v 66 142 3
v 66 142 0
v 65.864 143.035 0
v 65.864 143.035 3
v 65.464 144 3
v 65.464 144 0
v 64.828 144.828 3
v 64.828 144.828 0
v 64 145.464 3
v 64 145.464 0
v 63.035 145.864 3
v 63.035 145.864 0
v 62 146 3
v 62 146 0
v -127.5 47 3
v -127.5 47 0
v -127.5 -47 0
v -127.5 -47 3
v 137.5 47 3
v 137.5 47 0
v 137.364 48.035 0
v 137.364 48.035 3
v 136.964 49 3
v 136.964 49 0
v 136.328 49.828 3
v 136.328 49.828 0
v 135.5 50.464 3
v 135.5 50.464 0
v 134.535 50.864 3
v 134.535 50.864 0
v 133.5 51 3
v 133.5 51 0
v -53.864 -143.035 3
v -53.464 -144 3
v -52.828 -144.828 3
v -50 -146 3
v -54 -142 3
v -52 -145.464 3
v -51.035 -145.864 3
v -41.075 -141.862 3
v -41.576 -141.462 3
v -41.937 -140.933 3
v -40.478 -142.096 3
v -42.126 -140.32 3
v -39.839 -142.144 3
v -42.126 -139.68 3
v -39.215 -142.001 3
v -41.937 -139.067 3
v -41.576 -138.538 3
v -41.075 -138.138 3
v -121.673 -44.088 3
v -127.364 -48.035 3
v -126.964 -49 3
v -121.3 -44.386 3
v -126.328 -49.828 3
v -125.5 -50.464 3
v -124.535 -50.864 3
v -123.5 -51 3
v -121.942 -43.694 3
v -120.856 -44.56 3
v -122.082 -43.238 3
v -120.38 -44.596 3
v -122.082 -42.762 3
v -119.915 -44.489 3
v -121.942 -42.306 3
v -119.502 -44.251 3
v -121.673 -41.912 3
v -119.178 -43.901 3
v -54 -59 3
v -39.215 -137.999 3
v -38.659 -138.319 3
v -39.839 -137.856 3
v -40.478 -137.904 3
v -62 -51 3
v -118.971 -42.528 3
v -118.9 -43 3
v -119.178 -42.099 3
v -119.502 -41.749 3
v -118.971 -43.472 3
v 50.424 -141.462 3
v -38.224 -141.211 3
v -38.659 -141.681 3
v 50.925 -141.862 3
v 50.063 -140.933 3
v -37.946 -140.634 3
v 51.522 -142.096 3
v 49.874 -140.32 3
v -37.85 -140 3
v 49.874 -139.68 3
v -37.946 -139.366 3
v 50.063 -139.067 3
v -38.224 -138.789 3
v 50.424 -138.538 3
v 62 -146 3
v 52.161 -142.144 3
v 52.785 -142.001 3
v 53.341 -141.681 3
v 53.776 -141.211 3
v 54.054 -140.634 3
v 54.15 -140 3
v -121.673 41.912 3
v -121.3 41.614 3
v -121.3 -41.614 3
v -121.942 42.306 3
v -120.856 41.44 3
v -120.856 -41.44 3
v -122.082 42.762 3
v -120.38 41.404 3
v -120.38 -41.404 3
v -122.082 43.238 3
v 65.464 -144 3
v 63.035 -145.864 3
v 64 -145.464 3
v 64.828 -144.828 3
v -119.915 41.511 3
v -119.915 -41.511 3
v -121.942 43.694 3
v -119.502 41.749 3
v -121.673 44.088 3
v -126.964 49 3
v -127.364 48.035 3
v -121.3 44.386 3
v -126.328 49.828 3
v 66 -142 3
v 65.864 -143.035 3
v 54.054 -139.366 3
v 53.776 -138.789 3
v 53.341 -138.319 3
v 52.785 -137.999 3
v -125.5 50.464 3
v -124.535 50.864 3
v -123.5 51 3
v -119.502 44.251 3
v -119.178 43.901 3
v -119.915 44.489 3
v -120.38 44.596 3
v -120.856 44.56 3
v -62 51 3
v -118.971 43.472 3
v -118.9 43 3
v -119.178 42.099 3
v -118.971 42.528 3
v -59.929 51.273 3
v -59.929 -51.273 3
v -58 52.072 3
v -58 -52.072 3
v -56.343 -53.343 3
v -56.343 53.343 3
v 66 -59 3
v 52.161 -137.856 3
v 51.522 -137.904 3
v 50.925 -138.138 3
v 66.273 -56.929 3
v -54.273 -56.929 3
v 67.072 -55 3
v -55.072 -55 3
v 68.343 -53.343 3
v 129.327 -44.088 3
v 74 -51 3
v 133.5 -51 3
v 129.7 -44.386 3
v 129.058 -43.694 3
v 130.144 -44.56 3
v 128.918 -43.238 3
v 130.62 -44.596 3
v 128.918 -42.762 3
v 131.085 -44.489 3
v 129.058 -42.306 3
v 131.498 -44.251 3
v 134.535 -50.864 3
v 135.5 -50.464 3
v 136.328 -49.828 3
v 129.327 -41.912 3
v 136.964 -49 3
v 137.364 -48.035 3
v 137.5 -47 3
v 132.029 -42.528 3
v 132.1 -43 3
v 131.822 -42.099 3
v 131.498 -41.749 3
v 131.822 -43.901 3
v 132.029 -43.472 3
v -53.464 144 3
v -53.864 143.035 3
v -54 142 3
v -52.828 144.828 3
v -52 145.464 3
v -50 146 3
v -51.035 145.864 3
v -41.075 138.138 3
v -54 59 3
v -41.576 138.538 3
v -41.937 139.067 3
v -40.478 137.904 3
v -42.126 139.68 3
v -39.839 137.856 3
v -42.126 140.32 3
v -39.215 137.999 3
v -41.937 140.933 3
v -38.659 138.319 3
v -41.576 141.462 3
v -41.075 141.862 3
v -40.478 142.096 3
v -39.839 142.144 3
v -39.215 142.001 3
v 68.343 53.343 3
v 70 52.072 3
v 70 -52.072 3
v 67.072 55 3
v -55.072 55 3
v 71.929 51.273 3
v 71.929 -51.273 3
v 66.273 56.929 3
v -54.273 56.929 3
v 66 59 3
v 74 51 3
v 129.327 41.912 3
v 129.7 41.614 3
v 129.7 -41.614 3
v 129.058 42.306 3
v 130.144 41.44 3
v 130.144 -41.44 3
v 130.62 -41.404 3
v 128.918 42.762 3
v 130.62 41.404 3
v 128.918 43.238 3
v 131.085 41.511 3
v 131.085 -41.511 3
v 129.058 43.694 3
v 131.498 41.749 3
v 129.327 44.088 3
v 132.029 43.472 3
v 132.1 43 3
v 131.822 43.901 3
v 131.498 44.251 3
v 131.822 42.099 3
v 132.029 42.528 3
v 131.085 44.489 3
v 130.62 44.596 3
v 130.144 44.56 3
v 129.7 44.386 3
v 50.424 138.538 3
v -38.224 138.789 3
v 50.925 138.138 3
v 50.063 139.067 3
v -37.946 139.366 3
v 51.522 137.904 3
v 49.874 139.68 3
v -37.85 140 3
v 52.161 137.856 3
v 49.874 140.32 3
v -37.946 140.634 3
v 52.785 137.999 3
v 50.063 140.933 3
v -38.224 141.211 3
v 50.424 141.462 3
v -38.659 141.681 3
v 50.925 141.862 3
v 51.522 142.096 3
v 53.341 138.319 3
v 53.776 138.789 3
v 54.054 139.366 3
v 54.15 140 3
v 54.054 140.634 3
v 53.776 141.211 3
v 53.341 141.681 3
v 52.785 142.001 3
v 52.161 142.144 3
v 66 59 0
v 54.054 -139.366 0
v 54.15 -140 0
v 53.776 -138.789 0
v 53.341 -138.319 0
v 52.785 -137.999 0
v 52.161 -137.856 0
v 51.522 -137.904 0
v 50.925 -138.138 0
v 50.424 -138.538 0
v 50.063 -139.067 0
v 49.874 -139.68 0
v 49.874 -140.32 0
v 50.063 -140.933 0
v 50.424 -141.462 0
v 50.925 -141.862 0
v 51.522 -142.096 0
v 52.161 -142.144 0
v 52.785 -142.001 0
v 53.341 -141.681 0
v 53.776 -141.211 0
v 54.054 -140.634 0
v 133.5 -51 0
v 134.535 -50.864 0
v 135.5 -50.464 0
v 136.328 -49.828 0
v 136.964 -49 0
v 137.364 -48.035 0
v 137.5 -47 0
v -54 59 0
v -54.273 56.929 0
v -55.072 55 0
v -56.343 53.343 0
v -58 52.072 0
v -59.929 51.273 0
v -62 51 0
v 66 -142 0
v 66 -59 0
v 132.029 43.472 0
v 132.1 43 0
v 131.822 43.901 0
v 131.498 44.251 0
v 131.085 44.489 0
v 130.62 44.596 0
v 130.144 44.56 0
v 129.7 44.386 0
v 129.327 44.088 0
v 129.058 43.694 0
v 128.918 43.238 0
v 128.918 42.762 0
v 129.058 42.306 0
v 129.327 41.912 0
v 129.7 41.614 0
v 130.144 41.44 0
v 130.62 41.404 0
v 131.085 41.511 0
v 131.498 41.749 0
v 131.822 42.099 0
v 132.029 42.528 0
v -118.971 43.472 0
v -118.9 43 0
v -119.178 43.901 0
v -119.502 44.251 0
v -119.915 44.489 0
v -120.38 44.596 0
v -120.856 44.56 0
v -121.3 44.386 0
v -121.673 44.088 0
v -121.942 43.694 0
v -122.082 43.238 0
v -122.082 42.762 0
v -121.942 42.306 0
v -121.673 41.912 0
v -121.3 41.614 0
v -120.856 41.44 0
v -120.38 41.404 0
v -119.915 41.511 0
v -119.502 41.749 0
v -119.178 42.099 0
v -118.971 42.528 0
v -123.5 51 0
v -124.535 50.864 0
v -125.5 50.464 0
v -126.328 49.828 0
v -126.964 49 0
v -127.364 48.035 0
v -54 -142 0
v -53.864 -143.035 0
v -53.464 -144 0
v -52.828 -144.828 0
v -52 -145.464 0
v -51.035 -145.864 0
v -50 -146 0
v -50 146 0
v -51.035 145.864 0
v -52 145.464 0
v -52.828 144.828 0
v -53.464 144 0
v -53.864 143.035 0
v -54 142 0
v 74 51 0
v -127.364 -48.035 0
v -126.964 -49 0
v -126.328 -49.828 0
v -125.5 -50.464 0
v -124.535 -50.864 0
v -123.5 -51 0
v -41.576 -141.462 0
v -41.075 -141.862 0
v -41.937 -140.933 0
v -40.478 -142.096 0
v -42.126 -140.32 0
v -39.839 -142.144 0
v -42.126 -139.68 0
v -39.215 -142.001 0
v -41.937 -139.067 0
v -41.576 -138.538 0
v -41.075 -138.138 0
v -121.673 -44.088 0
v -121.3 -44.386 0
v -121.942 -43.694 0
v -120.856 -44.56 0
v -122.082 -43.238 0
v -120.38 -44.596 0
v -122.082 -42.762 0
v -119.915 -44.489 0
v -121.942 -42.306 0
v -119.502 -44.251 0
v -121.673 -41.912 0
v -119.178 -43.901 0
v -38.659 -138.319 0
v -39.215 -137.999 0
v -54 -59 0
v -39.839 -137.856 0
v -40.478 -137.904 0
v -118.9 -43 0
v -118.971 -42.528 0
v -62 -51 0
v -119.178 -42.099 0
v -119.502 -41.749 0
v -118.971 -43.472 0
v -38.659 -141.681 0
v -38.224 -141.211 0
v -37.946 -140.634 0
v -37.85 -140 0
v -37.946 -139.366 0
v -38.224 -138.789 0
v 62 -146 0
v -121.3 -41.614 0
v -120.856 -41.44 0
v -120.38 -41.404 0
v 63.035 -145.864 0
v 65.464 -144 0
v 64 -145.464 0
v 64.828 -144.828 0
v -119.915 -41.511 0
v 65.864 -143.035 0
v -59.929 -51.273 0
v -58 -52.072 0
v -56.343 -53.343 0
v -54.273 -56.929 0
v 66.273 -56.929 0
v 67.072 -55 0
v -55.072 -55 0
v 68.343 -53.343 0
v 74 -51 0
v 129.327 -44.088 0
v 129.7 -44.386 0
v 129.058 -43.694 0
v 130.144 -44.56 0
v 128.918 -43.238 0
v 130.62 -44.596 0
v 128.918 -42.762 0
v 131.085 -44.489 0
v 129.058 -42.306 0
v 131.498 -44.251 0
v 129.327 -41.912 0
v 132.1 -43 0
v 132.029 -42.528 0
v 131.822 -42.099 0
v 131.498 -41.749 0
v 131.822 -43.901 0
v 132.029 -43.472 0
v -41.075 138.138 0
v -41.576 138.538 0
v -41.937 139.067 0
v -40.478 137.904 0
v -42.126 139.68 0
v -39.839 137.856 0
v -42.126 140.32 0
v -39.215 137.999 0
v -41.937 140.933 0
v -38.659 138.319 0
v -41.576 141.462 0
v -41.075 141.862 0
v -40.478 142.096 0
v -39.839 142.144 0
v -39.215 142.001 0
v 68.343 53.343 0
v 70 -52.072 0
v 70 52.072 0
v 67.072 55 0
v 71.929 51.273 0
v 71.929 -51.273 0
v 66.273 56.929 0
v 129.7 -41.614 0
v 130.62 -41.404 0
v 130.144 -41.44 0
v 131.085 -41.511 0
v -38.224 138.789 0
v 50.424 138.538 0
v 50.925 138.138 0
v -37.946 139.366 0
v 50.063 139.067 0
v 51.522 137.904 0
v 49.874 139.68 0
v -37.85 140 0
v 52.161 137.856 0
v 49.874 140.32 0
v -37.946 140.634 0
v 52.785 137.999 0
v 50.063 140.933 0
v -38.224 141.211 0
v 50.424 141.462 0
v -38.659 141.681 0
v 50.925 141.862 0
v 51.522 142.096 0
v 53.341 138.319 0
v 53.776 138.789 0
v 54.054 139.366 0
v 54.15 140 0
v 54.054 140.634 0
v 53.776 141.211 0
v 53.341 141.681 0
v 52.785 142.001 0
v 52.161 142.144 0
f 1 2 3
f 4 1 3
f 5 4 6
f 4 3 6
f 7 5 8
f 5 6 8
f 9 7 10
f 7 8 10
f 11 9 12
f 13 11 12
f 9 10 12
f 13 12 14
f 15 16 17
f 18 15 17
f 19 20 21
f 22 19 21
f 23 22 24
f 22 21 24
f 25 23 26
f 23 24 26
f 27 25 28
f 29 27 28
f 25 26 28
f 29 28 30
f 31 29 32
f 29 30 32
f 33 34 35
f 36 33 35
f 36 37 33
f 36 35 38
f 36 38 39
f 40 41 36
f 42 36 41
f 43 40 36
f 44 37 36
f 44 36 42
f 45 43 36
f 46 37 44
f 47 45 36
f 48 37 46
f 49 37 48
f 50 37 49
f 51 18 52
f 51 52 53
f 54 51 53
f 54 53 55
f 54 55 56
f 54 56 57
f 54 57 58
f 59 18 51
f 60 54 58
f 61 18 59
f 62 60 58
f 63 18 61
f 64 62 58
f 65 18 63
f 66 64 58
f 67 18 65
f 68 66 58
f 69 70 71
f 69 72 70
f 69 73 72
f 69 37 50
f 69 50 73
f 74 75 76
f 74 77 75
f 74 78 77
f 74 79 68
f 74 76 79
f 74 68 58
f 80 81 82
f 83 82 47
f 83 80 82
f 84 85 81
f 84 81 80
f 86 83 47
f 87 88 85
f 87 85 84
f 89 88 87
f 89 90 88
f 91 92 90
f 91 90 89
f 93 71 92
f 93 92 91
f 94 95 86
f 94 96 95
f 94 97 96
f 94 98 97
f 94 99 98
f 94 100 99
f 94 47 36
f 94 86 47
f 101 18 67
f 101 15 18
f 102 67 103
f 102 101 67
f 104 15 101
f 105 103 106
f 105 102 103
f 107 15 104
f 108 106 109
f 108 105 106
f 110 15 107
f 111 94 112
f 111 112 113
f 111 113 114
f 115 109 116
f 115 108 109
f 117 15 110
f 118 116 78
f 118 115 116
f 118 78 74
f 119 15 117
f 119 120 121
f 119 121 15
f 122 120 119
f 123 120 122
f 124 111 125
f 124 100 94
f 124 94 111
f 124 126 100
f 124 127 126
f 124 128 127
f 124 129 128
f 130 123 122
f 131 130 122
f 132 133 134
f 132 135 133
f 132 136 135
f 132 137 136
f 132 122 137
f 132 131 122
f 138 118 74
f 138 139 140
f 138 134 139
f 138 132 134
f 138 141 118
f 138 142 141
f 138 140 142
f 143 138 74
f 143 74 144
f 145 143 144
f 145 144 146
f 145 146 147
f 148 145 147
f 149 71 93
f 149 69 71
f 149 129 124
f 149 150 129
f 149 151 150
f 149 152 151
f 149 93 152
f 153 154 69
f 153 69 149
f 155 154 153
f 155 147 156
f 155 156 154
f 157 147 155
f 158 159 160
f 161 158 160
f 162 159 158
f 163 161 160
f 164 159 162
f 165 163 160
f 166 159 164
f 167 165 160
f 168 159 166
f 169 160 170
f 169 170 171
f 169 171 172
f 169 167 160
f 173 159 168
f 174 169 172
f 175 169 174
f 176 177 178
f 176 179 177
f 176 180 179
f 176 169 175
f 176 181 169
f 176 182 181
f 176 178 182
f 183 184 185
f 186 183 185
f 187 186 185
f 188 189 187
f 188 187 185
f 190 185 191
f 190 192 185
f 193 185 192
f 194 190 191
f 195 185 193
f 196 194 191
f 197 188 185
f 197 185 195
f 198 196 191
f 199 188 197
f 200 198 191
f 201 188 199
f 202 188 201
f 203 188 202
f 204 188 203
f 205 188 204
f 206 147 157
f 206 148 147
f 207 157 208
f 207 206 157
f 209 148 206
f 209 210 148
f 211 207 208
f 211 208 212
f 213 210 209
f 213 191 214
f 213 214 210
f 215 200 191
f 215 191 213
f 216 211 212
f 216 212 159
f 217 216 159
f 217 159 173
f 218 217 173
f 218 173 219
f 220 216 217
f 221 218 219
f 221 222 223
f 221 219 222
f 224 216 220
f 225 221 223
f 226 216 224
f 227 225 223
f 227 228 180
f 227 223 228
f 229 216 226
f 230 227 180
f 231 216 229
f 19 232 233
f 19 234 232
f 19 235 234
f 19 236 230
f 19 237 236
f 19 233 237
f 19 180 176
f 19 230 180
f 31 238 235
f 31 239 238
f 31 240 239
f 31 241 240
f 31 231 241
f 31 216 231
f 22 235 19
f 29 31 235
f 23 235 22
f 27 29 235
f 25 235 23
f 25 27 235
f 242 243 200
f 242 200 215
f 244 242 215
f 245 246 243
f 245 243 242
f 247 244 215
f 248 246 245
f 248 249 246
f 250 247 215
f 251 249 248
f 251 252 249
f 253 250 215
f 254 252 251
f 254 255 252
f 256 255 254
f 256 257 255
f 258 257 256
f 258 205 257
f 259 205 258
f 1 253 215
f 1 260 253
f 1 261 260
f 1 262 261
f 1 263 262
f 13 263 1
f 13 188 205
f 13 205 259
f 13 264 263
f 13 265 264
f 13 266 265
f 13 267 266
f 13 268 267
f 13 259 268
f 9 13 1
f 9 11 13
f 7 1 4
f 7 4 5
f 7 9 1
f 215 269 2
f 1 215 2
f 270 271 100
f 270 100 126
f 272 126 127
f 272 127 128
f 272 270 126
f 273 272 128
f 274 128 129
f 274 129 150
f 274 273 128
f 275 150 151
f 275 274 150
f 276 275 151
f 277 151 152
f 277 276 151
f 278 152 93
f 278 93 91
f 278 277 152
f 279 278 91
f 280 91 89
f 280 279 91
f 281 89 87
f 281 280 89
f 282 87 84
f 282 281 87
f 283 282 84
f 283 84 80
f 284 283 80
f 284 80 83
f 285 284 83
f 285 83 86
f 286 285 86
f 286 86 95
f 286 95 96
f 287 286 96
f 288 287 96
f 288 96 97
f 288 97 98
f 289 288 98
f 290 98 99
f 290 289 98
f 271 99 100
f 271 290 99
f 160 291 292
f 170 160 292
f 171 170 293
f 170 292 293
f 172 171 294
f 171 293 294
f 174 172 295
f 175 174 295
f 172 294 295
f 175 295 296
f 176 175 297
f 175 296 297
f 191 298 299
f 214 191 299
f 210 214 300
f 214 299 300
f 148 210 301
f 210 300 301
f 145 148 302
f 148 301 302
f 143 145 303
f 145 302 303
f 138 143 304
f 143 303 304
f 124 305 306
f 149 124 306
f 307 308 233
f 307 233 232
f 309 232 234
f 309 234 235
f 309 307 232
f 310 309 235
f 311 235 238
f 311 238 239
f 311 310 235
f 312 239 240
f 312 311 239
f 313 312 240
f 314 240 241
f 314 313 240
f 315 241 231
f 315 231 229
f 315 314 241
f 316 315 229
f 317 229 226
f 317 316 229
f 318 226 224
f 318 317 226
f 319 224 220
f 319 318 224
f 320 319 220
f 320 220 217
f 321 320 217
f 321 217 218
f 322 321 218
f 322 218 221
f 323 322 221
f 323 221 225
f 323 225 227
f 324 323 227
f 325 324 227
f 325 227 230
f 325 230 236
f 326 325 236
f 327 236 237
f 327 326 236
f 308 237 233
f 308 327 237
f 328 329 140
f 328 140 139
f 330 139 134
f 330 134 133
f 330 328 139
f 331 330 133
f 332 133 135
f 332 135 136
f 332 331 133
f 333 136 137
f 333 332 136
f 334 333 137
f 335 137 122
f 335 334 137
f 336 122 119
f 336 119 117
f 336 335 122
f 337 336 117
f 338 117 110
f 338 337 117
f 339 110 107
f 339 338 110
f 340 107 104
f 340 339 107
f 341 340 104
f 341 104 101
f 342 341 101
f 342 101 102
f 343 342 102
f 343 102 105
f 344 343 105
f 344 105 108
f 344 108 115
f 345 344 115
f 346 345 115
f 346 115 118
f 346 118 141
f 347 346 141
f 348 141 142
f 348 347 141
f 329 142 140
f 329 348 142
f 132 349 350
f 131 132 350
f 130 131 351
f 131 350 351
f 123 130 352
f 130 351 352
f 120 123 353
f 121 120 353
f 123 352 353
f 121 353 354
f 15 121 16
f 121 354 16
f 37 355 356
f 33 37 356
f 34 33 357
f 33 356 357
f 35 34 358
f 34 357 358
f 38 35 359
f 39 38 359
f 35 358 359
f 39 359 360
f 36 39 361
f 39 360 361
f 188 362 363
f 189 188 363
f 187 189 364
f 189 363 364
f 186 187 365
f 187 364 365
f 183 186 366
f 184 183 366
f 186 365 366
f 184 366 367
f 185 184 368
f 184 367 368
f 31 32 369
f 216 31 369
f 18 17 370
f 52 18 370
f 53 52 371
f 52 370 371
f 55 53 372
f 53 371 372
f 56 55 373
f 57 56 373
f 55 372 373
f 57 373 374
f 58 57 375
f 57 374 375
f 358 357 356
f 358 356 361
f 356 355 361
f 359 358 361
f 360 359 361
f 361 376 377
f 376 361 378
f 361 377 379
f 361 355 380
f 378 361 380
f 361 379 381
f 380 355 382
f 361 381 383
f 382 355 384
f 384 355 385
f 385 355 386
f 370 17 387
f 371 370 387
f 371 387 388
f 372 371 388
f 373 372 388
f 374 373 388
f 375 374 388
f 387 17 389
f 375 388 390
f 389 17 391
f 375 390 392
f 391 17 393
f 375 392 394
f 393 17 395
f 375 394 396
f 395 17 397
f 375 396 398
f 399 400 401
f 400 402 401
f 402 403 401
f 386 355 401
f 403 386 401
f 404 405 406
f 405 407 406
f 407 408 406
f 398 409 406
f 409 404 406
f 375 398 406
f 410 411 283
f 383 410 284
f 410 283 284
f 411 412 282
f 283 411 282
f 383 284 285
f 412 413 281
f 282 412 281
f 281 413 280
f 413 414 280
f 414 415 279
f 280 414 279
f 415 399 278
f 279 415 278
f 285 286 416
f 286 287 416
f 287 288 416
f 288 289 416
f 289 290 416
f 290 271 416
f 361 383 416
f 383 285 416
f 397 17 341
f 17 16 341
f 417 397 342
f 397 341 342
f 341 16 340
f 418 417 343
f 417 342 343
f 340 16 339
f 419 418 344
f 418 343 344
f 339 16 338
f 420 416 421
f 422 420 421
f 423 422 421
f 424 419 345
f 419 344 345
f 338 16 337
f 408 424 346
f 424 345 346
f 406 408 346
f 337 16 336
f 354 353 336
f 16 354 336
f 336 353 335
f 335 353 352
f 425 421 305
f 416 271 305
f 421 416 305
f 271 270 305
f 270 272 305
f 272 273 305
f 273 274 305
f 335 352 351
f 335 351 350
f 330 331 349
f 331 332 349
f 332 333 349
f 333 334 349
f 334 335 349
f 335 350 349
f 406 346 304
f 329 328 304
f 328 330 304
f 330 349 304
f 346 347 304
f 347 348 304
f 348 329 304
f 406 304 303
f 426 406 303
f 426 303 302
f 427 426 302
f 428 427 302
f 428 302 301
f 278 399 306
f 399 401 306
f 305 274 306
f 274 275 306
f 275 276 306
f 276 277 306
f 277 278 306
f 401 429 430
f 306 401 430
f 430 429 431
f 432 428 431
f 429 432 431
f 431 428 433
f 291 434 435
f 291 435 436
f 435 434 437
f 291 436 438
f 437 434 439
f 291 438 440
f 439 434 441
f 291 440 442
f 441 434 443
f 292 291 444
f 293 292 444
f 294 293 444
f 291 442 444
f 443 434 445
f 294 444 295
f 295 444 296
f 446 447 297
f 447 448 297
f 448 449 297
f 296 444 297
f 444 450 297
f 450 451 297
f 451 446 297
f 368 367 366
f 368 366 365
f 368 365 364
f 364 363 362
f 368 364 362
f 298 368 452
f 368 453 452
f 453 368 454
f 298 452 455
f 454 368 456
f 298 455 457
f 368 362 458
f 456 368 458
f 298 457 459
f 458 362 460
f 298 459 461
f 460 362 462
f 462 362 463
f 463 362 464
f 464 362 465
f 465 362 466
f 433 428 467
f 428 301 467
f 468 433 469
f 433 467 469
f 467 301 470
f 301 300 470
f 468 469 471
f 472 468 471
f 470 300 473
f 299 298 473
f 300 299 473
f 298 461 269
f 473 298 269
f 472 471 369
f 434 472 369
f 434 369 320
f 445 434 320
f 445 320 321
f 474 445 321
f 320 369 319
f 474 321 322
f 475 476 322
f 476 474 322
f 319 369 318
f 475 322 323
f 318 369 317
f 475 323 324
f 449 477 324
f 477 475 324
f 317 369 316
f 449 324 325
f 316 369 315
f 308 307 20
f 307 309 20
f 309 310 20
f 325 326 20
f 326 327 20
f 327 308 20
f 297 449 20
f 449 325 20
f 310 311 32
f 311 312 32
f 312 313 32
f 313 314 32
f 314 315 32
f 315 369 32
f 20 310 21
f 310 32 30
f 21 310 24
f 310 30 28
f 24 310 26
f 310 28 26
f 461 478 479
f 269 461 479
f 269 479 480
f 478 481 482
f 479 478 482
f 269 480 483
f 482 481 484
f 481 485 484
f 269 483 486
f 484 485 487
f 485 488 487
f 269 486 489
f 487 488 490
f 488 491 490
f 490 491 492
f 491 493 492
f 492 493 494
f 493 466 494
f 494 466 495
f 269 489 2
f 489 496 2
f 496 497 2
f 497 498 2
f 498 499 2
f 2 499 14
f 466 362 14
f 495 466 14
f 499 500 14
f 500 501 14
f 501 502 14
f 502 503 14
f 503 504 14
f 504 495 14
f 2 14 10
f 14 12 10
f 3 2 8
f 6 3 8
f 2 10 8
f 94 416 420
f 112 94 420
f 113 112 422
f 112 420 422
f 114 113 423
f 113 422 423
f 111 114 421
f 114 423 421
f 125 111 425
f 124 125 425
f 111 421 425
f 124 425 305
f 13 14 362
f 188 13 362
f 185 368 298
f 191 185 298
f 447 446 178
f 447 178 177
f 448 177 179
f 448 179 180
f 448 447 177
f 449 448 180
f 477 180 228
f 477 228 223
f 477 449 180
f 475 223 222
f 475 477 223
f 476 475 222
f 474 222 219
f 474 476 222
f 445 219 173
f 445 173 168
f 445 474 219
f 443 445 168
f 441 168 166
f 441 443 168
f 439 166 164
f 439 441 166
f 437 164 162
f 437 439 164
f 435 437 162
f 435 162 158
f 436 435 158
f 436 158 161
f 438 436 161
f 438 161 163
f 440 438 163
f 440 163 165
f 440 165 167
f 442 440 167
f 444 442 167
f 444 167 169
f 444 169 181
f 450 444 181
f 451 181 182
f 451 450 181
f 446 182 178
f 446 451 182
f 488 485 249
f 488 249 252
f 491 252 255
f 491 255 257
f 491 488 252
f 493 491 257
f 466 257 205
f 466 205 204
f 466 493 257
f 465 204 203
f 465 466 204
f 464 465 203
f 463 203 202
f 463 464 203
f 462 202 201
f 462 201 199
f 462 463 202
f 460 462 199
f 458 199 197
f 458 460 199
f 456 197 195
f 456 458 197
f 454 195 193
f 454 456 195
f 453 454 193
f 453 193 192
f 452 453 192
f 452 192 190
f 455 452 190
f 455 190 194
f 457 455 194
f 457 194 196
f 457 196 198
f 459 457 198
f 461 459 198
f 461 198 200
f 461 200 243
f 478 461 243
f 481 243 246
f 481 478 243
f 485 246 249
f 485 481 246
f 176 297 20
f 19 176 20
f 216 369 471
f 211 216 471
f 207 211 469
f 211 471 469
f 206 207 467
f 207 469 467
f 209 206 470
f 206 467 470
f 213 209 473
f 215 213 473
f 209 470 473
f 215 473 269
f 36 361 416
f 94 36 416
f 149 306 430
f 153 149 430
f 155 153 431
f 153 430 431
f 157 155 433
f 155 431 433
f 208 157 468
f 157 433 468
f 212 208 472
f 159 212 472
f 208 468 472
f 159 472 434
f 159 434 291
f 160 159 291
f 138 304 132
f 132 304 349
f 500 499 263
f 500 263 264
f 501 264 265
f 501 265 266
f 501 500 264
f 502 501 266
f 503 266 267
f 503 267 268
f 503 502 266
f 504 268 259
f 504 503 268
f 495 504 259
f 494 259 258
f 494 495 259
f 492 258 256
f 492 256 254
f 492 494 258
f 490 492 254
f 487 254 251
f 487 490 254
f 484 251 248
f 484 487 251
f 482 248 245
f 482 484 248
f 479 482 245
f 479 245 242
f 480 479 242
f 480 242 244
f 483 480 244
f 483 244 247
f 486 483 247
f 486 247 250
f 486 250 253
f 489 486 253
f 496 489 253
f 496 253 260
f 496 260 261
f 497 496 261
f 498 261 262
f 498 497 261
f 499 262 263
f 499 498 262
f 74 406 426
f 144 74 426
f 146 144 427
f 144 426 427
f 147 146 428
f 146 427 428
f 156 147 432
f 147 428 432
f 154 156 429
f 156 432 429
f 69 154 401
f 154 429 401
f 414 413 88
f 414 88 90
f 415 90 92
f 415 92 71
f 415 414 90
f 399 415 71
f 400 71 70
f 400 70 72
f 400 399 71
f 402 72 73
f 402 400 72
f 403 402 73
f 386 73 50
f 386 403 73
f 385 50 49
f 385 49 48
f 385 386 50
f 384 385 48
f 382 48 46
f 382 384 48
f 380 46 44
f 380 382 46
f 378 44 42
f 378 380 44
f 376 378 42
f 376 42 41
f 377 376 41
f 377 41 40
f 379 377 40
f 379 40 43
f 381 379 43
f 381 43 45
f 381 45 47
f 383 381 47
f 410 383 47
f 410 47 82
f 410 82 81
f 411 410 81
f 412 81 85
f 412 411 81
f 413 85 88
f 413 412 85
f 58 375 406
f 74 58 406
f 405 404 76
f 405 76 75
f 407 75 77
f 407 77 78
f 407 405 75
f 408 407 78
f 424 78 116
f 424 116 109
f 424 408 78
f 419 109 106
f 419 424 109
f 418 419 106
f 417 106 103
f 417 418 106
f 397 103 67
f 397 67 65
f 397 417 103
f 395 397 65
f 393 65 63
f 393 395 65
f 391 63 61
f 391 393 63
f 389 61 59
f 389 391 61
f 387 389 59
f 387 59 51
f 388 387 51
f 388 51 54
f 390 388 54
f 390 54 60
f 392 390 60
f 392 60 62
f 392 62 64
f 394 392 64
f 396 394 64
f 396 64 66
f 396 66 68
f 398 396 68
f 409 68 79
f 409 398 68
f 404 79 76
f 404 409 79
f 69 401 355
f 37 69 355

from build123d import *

# Parameters (mm, degrees)
SKETCH_183_R   = 2.15
SKETCH_183_R_2 = 1.6
F_3MM_DEPTH    = 3


with BuildPart() as part:
    # Sketch 183 → 二层板_拉伸3mm (new body)
    with BuildSketch(Plane.XY):
        with BuildLine():
            Line((-50, -146), (62, -146))
            ThreePointArc((62, -146), (64.828427125, -144.828427125), (66, -142))
            Line((66, -142), (66, -59))
            ThreePointArc((66, -59), (68.343145751, -53.343145751), (74, -51))
            Line((74, -51), (133.5, -51))
            ThreePointArc((133.5, -51), (136.328427125, -49.828427125), (137.5, -47))
            Line((137.5, -47), (137.5, 47))
            ThreePointArc((137.5, 47), (136.328427125, 49.828427125), (133.5, 51))
            Line((133.5, 51), (74, 51))
            ThreePointArc((74, 51), (68.343145751, 53.343145751), (66, 59))
            Line((66, 59), (66, 142))
            ThreePointArc((66, 142), (64.828427125, 144.828427125), (62, 146))
            Line((62, 146), (-50, 146))
            ThreePointArc((-50, 146), (-52.828427125, 144.828427125), (-54, 142))
            Line((-54, 142), (-54, 59))
            ThreePointArc((-54, 59), (-56.343145751, 53.343145751), (-62, 51))
            Line((-62, 51), (-123.5, 51))
            ThreePointArc((-123.5, 51), (-126.328427125, 49.828427125), (-127.5, 47))
            Line((-127.5, 47), (-127.5, -47))
            ThreePointArc((-127.5, -47), (-126.328427125, -49.828427125), (-123.5, -51))
            Line((-123.5, -51), (-62, -51))
            ThreePointArc((-62, -51), (-56.343145751, -53.343145751), (-54, -59))
            Line((-54, -59), (-54, -142))
            ThreePointArc((-54, -142), (-52.828427125, -144.828427125), (-50, -146))
        make_face()
        with Locations((-40, 140)):
            Circle(SKETCH_183_R, mode=Mode.SUBTRACT)
        with Locations((52, 140)):
            Circle(SKETCH_183_R, mode=Mode.SUBTRACT)
        with Locations((-120.5, 43)):
            Circle(SKETCH_183_R_2, mode=Mode.SUBTRACT)
        with Locations((130.5, 43)):
            Circle(SKETCH_183_R_2, mode=Mode.SUBTRACT)
        with Locations((-120.5, -43)):
            Circle(SKETCH_183_R_2, mode=Mode.SUBTRACT)
        with Locations((130.5, -43)):
            Circle(SKETCH_183_R_2, mode=Mode.SUBTRACT)
        with Locations((-40, -140)):
            Circle(SKETCH_183_R, mode=Mode.SUBTRACT)
        with Locations((52, -140)):
            Circle(SKETCH_183_R, mode=Mode.SUBTRACT)
    extrude(amount=F_3MM_DEPTH)


solid = part.part
